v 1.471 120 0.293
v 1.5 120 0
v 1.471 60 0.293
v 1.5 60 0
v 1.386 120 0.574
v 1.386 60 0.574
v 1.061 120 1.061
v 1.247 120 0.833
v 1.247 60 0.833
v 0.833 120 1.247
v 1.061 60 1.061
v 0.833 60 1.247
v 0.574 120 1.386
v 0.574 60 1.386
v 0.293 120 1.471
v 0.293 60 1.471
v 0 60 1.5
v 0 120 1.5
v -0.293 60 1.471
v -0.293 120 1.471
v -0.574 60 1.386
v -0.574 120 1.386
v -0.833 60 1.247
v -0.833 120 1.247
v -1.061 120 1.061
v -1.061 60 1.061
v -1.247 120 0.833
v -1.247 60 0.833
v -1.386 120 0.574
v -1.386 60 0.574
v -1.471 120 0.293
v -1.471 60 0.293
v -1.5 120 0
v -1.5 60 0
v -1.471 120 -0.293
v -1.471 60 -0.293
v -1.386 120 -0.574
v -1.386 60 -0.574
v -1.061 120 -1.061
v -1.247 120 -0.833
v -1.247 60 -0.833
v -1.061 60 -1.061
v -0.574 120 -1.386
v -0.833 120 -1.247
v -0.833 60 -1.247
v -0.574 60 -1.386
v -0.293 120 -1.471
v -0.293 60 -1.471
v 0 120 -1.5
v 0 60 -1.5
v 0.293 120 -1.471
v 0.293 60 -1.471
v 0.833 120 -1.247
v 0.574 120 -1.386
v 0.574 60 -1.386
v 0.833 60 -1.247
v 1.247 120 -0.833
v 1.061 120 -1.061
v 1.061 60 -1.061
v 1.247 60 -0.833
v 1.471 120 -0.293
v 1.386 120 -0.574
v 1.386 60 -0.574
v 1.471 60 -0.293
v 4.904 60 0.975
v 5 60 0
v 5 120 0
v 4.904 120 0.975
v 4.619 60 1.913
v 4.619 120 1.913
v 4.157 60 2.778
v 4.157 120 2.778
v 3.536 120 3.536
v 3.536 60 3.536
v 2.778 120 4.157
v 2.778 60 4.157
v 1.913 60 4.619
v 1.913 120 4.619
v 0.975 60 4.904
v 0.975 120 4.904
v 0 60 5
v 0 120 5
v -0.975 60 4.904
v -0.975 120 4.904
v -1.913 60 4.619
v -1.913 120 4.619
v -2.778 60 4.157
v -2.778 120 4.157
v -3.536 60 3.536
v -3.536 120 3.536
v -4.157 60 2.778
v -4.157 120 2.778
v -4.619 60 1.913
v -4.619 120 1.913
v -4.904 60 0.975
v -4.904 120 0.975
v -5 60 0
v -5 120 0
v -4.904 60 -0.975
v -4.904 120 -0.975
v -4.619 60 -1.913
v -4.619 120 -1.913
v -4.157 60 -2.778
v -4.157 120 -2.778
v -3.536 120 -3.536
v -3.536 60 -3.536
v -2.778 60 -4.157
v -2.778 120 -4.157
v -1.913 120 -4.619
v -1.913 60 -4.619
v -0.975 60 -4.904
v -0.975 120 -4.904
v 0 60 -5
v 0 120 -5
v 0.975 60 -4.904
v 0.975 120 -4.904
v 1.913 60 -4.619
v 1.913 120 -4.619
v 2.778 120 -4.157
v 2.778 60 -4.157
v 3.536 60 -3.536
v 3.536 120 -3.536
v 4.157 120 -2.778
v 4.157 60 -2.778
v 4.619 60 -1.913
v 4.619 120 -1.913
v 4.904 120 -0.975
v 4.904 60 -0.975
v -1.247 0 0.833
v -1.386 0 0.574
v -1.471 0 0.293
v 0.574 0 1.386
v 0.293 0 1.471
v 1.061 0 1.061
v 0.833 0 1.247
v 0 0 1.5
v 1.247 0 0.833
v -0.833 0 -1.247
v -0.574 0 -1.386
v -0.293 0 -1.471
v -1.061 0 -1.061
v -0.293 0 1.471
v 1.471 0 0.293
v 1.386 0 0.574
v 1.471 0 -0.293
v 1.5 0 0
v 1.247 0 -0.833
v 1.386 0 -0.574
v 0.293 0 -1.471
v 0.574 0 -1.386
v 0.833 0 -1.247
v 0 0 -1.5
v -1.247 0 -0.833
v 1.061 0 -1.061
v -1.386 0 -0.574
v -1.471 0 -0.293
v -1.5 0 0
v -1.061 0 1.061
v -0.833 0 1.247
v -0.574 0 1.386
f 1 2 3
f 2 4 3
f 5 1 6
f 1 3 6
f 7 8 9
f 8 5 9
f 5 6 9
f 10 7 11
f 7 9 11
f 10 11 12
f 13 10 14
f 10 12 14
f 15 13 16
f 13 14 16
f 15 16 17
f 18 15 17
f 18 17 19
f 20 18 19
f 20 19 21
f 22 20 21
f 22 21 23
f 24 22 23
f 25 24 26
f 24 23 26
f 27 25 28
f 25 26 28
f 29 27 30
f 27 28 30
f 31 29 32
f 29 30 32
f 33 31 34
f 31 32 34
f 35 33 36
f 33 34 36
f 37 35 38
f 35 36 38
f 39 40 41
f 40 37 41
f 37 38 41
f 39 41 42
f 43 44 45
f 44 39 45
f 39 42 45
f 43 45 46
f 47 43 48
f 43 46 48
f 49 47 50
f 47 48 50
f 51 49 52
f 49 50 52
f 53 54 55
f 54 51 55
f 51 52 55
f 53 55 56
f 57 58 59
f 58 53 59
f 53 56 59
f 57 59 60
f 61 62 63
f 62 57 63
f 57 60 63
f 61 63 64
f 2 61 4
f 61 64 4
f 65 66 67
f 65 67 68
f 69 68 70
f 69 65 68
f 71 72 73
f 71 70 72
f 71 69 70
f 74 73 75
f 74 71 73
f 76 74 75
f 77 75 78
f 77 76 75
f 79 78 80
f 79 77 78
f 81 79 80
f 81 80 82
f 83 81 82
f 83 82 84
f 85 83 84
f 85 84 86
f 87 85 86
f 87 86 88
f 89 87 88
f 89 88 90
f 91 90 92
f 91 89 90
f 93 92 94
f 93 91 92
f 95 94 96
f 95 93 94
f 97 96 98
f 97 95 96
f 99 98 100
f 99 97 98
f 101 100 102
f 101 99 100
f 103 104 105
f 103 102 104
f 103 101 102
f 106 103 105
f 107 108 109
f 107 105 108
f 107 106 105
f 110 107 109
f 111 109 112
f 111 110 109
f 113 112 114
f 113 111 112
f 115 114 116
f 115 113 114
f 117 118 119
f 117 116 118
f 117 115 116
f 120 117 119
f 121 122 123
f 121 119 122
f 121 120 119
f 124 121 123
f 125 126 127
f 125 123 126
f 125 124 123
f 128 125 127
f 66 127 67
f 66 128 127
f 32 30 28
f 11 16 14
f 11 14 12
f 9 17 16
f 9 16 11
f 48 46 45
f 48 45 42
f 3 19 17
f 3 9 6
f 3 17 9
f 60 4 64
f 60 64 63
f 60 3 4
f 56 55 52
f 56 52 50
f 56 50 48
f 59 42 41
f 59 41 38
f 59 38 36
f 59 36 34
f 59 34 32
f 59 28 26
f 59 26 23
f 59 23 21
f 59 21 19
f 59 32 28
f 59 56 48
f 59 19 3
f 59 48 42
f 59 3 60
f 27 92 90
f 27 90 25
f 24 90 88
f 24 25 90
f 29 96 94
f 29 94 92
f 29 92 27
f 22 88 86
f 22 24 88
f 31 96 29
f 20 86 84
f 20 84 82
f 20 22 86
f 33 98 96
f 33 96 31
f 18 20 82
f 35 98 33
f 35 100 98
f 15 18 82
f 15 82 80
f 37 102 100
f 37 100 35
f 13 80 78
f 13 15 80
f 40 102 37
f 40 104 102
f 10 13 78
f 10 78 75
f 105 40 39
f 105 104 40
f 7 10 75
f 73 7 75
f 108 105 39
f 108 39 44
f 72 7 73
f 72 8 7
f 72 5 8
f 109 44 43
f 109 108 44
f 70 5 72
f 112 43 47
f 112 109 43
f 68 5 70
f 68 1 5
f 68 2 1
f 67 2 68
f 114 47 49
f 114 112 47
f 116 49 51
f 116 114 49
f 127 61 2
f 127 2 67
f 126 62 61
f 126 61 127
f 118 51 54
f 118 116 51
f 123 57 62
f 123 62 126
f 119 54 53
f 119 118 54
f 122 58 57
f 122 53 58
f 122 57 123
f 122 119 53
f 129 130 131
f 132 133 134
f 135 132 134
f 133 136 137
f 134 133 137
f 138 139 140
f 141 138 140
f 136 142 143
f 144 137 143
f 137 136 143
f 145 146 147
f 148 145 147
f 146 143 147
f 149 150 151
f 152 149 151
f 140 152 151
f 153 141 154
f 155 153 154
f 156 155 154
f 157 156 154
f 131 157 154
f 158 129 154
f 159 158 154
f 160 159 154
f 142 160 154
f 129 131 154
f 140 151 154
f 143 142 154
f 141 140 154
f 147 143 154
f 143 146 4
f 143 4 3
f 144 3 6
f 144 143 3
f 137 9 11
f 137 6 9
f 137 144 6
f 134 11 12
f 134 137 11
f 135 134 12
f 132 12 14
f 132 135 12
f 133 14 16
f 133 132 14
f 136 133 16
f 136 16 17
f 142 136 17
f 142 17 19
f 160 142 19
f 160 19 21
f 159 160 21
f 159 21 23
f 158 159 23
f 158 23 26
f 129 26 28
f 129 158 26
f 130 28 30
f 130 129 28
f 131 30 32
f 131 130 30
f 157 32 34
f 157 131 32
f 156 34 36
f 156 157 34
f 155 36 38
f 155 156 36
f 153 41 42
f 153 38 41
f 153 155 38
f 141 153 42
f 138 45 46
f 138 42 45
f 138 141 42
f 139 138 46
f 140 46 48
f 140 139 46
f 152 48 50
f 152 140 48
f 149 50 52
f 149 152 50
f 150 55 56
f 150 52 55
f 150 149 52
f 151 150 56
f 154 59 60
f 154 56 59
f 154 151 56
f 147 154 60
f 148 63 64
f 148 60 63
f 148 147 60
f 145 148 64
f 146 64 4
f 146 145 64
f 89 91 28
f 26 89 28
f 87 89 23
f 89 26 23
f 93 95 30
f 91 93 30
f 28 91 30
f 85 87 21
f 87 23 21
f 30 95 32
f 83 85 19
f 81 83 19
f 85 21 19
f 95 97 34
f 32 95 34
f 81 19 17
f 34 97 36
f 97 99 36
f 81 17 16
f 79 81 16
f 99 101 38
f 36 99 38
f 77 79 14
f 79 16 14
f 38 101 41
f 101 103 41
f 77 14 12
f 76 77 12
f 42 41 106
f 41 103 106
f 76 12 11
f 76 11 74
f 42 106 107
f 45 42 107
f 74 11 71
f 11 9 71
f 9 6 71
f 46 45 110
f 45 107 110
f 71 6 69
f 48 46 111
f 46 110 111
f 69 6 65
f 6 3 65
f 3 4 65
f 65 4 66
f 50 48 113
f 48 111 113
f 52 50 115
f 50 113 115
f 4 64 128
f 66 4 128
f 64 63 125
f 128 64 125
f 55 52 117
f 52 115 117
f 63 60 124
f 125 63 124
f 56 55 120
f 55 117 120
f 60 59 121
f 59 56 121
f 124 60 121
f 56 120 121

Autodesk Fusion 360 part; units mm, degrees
sketch "Sketch1" plane through (0, 0, 0) normal (0, 1, 0) x (1, 0, 0)
  circle A0 centre (0, 0) radius 1.5
  circle A1 centre (0, 0) radius 5
  dimension "d1" = 3
  dimension "d2" = 10
extrude "Extrude1" add sketch "Sketch1" along normal blind 60 contours A0 makes body 1
extrude "Extrude2" add sketch "Sketch1" along normal blind 120 and the other way blind -60 separate body makes body 2
